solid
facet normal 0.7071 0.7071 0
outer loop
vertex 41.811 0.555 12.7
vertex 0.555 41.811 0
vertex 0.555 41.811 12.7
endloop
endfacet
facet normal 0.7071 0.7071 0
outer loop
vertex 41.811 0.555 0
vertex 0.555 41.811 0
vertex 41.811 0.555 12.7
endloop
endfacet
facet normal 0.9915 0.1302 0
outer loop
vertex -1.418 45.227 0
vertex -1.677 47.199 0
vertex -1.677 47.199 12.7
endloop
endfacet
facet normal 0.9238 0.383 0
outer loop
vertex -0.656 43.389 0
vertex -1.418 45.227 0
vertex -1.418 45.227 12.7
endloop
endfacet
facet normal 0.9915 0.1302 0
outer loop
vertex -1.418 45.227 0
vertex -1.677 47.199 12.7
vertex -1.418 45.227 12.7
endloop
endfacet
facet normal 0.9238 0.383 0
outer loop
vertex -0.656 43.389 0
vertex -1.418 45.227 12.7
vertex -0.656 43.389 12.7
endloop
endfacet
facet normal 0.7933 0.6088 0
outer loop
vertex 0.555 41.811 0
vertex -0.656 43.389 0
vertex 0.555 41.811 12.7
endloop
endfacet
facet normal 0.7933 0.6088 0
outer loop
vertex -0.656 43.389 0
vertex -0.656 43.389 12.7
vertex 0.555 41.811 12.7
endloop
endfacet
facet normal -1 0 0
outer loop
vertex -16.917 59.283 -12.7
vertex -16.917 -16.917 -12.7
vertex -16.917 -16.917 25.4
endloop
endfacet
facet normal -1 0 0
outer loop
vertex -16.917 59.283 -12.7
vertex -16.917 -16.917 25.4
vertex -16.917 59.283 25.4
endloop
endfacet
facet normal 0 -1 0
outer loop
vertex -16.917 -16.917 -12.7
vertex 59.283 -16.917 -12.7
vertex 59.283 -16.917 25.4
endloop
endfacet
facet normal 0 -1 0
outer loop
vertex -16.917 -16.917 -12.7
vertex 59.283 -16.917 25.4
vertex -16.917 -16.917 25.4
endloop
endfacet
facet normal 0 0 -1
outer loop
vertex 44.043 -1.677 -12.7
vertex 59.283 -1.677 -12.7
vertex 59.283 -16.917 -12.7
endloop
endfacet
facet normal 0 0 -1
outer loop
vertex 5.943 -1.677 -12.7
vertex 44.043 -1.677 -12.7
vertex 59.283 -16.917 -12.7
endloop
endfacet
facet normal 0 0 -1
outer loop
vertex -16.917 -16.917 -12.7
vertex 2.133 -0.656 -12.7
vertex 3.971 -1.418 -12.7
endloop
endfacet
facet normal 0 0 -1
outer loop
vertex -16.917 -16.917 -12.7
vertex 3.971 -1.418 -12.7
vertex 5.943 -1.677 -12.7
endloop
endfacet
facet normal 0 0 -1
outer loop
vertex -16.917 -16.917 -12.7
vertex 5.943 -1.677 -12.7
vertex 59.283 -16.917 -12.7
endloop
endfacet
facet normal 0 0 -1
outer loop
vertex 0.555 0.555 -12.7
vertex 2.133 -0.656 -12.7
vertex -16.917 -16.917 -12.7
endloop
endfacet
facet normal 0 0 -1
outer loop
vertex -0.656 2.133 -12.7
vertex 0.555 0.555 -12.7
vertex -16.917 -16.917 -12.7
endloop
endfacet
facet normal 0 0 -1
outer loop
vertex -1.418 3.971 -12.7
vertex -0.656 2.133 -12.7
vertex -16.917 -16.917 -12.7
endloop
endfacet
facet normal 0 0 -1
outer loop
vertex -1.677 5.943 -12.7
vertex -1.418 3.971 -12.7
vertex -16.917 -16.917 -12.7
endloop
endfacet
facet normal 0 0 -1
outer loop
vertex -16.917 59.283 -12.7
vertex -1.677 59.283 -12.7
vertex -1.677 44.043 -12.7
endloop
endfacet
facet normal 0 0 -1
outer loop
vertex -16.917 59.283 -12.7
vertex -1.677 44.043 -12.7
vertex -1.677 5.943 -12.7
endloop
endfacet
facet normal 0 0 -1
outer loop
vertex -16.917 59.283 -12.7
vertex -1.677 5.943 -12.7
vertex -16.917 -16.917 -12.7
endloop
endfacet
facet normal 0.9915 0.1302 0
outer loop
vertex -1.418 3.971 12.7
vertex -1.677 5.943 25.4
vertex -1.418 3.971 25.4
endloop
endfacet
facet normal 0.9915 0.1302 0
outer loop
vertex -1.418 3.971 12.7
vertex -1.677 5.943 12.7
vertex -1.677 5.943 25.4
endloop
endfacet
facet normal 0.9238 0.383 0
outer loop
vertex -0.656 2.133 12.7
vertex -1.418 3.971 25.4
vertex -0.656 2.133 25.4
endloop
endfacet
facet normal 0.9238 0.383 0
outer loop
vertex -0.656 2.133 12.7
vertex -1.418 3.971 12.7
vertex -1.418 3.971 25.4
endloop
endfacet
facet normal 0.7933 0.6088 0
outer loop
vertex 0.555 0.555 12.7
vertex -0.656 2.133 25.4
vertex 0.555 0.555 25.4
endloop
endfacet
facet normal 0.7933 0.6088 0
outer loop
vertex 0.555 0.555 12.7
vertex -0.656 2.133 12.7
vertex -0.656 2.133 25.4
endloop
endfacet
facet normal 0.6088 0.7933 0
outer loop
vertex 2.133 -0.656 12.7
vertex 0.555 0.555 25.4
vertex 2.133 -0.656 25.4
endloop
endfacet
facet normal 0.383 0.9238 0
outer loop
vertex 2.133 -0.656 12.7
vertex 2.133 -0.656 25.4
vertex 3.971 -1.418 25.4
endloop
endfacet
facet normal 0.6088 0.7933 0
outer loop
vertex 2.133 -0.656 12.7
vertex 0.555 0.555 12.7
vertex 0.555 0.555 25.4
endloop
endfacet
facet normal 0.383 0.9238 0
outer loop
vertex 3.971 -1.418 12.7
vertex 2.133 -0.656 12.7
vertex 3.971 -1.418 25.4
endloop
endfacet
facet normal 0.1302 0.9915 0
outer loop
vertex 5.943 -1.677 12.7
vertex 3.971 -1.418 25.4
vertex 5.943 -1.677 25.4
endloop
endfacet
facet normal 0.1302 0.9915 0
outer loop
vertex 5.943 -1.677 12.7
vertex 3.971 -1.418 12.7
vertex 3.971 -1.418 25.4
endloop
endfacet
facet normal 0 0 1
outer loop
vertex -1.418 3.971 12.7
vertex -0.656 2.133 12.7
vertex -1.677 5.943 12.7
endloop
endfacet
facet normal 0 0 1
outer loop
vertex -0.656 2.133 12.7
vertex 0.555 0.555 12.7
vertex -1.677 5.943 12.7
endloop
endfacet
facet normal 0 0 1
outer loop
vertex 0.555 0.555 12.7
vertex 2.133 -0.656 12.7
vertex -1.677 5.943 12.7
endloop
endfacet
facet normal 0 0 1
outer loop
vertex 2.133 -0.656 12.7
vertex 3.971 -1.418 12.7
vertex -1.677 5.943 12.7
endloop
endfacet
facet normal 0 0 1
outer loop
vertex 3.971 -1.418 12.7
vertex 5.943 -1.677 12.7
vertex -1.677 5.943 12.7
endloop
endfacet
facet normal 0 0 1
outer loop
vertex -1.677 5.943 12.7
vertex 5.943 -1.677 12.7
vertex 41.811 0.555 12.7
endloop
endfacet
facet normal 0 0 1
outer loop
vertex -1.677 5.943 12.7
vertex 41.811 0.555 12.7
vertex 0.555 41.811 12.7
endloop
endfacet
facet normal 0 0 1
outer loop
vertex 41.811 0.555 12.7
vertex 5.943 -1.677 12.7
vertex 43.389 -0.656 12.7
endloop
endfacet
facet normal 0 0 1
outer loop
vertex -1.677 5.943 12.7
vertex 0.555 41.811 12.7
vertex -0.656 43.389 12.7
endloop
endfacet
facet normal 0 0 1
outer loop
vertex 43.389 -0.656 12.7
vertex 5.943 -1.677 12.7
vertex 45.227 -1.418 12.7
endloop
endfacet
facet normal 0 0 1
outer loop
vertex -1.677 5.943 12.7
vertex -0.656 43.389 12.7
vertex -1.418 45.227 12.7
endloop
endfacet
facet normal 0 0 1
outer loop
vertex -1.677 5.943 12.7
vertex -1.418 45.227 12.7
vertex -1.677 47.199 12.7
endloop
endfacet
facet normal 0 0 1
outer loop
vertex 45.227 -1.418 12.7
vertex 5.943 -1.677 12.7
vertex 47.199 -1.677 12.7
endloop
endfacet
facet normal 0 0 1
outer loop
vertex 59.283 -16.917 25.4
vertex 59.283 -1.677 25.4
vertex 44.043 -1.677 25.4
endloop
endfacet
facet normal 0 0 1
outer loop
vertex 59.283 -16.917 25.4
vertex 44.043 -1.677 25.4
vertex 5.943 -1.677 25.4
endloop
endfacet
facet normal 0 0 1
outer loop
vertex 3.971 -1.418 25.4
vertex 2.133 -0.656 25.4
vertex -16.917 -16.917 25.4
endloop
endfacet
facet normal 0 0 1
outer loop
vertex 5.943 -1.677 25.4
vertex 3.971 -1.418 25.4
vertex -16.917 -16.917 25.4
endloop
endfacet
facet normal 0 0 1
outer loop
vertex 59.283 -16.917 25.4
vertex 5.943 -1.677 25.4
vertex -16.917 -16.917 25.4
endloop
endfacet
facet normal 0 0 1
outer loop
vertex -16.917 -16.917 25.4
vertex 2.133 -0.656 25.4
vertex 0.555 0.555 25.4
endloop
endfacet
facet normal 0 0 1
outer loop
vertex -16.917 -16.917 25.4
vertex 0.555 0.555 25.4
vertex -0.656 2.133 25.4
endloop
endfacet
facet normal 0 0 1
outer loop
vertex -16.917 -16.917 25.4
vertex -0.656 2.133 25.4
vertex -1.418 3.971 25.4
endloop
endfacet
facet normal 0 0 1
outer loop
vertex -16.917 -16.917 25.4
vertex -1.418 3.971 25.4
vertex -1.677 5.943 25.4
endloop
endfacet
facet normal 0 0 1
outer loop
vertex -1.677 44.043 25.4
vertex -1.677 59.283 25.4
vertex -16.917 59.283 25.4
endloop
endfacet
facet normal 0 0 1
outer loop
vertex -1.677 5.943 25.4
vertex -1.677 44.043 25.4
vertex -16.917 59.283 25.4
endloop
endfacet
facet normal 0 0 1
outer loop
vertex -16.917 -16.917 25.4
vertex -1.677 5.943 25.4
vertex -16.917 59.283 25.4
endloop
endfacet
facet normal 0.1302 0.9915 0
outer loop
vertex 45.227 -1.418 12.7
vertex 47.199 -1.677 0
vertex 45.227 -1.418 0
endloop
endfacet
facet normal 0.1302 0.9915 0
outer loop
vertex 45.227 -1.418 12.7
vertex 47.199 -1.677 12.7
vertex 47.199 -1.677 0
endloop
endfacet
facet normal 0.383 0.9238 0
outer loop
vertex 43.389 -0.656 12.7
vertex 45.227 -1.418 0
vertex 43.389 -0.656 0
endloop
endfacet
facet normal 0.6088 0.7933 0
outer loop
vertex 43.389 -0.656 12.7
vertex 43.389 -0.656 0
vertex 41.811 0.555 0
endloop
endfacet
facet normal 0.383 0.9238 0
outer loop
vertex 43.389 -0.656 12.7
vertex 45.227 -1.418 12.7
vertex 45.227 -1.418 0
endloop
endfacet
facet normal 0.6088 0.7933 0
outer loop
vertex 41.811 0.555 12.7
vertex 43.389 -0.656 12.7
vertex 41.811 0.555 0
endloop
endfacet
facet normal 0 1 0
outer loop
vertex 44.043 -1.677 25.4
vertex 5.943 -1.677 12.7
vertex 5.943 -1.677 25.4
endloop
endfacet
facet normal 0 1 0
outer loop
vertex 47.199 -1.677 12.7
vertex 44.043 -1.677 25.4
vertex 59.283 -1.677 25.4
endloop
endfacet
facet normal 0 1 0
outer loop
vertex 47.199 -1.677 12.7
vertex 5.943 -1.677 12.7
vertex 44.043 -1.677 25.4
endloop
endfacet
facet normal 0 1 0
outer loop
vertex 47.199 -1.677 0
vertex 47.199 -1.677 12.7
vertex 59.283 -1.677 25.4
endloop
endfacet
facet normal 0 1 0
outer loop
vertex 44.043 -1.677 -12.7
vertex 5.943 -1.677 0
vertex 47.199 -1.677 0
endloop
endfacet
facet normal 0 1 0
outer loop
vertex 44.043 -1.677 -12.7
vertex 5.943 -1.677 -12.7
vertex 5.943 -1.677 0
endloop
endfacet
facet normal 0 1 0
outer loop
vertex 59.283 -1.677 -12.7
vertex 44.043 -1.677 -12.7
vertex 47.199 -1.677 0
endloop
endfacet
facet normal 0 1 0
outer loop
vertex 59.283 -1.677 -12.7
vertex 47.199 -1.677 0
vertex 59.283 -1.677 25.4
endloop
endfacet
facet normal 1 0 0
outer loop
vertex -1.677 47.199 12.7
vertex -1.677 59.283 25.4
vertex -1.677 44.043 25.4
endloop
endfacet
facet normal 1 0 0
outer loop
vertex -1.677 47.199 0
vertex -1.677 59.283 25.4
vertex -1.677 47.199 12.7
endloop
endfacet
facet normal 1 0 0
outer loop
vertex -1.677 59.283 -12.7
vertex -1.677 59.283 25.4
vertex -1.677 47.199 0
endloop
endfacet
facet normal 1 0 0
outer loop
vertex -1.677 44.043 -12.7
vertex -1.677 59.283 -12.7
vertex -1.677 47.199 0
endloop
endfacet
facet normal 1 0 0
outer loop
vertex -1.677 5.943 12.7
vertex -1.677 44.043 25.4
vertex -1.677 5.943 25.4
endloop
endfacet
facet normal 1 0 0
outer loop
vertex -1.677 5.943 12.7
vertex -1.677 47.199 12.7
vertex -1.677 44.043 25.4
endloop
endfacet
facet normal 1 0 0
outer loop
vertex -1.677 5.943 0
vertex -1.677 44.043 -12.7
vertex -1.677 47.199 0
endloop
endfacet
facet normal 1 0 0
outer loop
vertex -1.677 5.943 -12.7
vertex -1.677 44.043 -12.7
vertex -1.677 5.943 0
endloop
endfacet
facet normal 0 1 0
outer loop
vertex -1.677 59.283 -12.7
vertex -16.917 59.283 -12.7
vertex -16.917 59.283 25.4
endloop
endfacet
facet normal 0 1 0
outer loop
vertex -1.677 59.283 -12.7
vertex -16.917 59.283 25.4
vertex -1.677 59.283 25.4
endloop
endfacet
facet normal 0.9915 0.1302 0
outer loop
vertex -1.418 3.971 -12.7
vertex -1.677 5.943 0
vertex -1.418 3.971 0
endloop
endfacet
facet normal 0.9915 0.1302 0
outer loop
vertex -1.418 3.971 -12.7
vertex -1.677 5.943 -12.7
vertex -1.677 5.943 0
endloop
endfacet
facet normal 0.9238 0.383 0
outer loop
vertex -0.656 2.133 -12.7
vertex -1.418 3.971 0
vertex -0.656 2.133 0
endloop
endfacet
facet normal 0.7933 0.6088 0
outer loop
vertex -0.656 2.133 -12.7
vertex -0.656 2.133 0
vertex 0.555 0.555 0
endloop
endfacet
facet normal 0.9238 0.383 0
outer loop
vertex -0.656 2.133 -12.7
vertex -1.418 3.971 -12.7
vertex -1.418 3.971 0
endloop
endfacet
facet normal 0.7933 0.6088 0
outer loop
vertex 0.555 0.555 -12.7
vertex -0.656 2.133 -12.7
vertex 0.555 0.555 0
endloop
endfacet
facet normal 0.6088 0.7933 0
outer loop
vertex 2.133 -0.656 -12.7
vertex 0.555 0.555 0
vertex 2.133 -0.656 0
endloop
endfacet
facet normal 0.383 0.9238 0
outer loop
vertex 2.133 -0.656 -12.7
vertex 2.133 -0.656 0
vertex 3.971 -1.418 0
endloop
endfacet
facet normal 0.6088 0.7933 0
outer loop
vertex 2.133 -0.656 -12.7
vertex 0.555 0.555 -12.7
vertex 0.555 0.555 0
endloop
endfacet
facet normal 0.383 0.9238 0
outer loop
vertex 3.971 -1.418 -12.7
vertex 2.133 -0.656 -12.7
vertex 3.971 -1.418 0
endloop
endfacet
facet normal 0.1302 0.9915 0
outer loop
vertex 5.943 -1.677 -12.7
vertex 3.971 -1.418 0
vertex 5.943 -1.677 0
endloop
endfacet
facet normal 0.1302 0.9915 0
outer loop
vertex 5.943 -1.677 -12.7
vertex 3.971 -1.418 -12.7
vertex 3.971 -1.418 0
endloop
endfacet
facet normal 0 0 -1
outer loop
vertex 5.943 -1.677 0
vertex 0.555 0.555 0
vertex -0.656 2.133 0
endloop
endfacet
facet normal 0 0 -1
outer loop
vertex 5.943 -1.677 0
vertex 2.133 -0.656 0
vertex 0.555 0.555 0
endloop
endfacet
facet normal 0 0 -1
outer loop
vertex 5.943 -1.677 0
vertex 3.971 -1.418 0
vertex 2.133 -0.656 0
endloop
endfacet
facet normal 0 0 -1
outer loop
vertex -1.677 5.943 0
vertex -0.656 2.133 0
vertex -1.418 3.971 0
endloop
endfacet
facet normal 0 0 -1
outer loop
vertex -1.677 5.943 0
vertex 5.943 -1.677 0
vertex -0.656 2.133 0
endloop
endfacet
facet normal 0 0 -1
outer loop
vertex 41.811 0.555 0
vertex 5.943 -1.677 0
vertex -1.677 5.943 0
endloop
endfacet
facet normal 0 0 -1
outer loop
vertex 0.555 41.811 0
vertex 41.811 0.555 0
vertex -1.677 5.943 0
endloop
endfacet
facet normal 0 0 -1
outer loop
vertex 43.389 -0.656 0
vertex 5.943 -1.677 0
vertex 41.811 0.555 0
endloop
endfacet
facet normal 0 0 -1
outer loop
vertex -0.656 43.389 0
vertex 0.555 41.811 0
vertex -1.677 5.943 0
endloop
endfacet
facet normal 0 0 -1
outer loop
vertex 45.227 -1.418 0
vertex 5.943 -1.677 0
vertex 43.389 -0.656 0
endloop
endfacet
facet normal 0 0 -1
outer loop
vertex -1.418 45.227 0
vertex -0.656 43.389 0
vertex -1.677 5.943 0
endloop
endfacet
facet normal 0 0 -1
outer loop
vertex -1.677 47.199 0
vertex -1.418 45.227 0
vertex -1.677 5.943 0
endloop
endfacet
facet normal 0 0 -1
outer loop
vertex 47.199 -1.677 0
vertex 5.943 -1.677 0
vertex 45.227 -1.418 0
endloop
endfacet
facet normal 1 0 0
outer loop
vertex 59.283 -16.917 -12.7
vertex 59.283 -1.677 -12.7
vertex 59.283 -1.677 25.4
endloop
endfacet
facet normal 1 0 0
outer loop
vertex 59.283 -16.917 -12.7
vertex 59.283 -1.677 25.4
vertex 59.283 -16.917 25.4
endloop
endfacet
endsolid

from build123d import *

# Parameters (mm, degrees)
BOSS_EXTRUDE1_DEPTH = 12.7
SKETCH3_W           = 4.233333333
SKETCH3_H           = 15.24
CUT_EXTRUDE1_DEPTH  = 20.32
FILLET1_R           = 2.54
FILLET2_R           = 2.54
SCALE1_SCALE        = 3


with BuildPart() as part:
    # Sketch1 → Boss-Extrude1 (new body)
    with BuildSketch(Plane.XY):
        Polygon((0, 0), (0, 25.4), (5.08, 25.4), (5.08, 20.32), (20.32, 5.08), (25.4, 5.08), (25.4, 0), align=None)
    extrude(amount=BOSS_EXTRUDE1_DEPTH)

    # Sketch3 → Cut-Extrude1 (cut)
    with BuildSketch(Plane(origin=(25.4, 0, 0), x_dir=(0, 0, -1), z_dir=(1, 0, 0))):
        with Locations((-10.583333334, 12.7)):
            Rectangle(SKETCH3_W, SKETCH3_H)
        with Locations((-2.116666667, 12.7)):
            Rectangle(SKETCH3_W, SKETCH3_H)
    extrude(amount=-CUT_EXTRUDE1_DEPTH, mode=Mode.SUBTRACT)

    # Fillet1
    fillet1_edges = [part.edges().sort_by_distance(p)[0] for p in [
        (5.08, 5.08, 10.583333333),
        (5.08, 5.08, 2.116666667),
    ]]
    fillet(fillet1_edges, radius=FILLET1_R)

    # Fillet2
    fillet2_edges = [part.edges().sort_by_distance(p)[0] for p in [
        (5.08, 20.32, 6.35),
        (20.32, 5.08, 6.35),
    ]]
    fillet(fillet2_edges, radius=FILLET2_R)


with BuildPart() as part_1:
    # Scale1: scaled about (8.45857593, 8.45857593, 6.35)
    add(part.part.scale(SCALE1_SCALE).moved(Location((-16.91715186, -16.91715186, -12.7))))


solid = part_1.part
